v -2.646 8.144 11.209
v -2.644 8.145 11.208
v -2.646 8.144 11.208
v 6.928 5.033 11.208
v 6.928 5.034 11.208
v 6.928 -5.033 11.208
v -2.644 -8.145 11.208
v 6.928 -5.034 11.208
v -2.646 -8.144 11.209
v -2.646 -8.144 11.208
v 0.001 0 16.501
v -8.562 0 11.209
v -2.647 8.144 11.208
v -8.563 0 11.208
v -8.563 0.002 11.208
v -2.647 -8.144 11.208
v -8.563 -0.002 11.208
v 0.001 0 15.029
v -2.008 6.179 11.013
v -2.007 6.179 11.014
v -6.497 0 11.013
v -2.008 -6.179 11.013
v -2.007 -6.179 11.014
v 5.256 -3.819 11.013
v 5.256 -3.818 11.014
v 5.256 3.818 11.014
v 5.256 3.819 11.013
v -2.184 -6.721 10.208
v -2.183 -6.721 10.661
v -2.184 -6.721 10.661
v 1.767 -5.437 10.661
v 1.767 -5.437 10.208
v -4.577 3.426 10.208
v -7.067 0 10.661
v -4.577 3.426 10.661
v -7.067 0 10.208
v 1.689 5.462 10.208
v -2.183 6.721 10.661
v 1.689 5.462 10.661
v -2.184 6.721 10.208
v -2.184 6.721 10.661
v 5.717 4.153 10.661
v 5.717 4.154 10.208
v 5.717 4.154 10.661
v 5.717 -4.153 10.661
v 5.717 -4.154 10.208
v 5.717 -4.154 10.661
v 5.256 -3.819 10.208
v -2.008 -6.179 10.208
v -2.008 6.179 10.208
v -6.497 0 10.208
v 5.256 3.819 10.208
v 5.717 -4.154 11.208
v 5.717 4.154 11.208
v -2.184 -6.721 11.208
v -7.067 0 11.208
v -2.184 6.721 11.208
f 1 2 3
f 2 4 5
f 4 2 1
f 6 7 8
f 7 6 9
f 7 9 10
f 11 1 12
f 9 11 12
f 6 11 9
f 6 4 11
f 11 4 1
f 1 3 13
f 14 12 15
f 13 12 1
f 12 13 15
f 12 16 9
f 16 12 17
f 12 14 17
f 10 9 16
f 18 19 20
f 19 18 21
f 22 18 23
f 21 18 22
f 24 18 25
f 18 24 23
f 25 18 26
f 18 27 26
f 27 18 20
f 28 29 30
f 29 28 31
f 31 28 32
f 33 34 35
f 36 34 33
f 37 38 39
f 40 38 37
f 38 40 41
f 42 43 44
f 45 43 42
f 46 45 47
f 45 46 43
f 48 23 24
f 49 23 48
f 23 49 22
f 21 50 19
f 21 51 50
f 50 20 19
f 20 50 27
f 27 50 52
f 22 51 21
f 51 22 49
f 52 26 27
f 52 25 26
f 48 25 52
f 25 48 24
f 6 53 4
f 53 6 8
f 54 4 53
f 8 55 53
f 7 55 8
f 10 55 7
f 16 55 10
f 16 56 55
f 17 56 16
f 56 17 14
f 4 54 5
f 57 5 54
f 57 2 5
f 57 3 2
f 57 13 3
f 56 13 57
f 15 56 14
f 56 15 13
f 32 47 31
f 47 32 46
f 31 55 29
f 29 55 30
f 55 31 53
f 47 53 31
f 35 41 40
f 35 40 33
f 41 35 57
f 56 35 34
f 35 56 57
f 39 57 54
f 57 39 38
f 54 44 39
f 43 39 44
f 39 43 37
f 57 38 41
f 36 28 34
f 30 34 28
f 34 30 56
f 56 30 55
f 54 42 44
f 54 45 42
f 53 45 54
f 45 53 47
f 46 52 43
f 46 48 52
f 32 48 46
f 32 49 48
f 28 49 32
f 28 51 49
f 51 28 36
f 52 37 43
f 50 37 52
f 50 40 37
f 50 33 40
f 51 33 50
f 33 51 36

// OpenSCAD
//arete = 21.409;
diameter = 33;
creux = 1; // creux ou plein || 1 ou 0
paroi = 1;
bouchon = 1; // 1 ou 0
corps = 0; // 1 ou 0
rotate_body = 0;
bottom_hole = 1; // 1 ou 0
bottom_hole_diameter = 1.5;
bouchonOffset = 0.4;
r = 0.19; // résolution d'impression sur l'axe Z

// Controle rotation viewport quand animation en route
//$vpr = [70, 0, $t * 180];

/* Forme
Choix parmi:
- 0 => Etoilé
- 1 => Christique
- 2 => Christique_inversé
- 3 => Pentakis // (all points on sphere)
- 4 => Animate // voir plus bas pour plus d'infos
*/
forme_ID = 1;

/////////

function dodeca_ext_radius(a) =
    a/2*(sqrt(2));

function dodeca_inradius(a) =
    a*sqrt(5/8+11/(8*sqrt(5)));

function dodeca_arete_from_inradius(radius) =
    radius/sqrt(5/8+11/(8*sqrt(5)));

function christic_arete_from_external_diameter(diam) =
    diam/(sqrt((5/2)+(11/10)*sqrt(5))+2*sqrt((5-sqrt(5))/10));

// rayon cercle inscrit
function polygon_apothem(arete, sides) =
  arete/(2*tan(180/sides));

function polygon_apothem_from_circumradius(circumradius, sides) =
  circumradius*cos(180/sides);

function polygon_circumradius_from_apothem(apothem, sides) =
  apothem/cos(180/sides);

arete = christic_arete_from_external_diameter(diameter);
areteInt = dodeca_arete_from_inradius(
            dodeca_inradius(arete)-paroi);
dodeca_inradius = dodeca_inradius(arete);

decoupe_bouchon_radius = polygon_circumradius_from_apothem(
                          polygon_apothem(arete, 5) - paroi+1*r,
                          5);
bouchon_radius = polygon_circumradius_from_apothem(
                          polygon_apothem(arete, 5) - paroi+1*r - bouchonOffset,
                          5);

echo("arete: ", arete);
echo("arete int: ", areteInt);
echo(str("dodeca_inradius : ", dodeca_inradius));
echo(str("decoupe_bouchon_radius : ", decoupe_bouchon_radius));
echo(str("bouchon_radius : ", bouchon_radius));

spike = [
    2.3417, // Etoilé, scale 1 is arete = 1.236 mm, diametre = 6.24 mm, arete pyramide = 2 mm
    0.8944, // Christique, scale 1 is arete = 1.236 mm, diametre = 4.05 mm
    -0.8944, // Christique inversé
    0.4279 // Pentakis
];

if (forme_ID == 4) {
    Animate();
} else {
    if (creux == 0) {
        small_stellated_dodecahedron(spike[forme_ID], small_stellated_dodecahedron);
    } else {
        if (corps == 1) {
          if (rotate_body == 1) {
            rotate([180, 0, 0]) corps_ouvert();
          } else {
            corps_ouvert();
          }
        }
        if (bouchon == 1) {
            bouchon();
        }
    }
}


module corps_ouvert() {

    difference() {
        poly_creux();
        decoupe_bouchon(decoupe_bouchon_radius);
    if (bottom_hole == 1) {
        bottom_hole();
    }
    }
}

module poly_creux() {
    difference() {
        small_stellated_dodecahedron(spike[forme_ID], arete);
        small_stellated_dodecahedron(spike[forme_ID], areteInt);
    }
}

module decoupe_bouchon(radius) {
    rotate([0,0,36]) translate([0,0, dodeca_inradius])
        cylinder(99, r=arete*0.853, $fn=5, center=false);
    rotate([0,0,36]) translate([0,0, dodeca_inradius-paroi])
        #cylinder(paroi, r=radius, $fn=5, center=false);
}

module supplement_feuillure_bouchon() {
    rotate([0,0,36]) translate([0,0, dodeca_inradius-paroi-1])
    difference() {
        cylinder(paroi+1, r=bouchon_radius, $fn=5, center=false);
        cylinder(paroi+1, r=bouchon_radius-3*r, $fn=5, center=false);
    }
}

module bouchon() {
    difference () {
        intersection() {
            union() {
                poly_creux();
                supplement_feuillure_bouchon();
            }
            decoupe_bouchon(bouchon_radius);
        }
    }
}

module bottom_hole() {
    rotate([0,0,0]) translate([0,0, -dodeca_inradius])
        #cylinder(dodeca_inradius, d=bottom_hole_diameter, $fn=20, center=true);
}

// }}

/*
animates the single parameter of the
module small_stellated_dodecahedron

1/ choose animate in the view menu
2/ sets fps to an appropiate number for
your machine - 20 is good
3/ set steps to a number that keeps the
change from happening too slowly or
too fast - 200 is good
*/
module Animate() {
    small_stellated_dodecahedron(-3.4317*abs(2*$t-1)+2.4317);
}

// Étoilé
// scale 1 is arete = 1.236 mm, diametre = 6.24 mm, arete pyramide = 2 mm
module Etoile(a) {
    small_stellated_dodecahedron(2.3417, a);
}

// Christique
// scale 1 is arete = 1.236 mm, diametre = 4.05 mm
module Christique(a) {
    small_stellated_dodecahedron(0.8944, a);
}

// Christique inversé
module Christique_inv(a) {
    small_stellated_dodecahedron(-0.8944, a);
}

// Pentakis (all points on sphere)
module Pentakis(a) {
    small_stellated_dodecahedron(0.4279, a);
}

module small_stellated_dodecahedron(scale, ar)
{
a=scale*0.61803;
b=scale*0.38197;

length = ar ? ar : arete;
echo("length:", length);
// scale(1) => arete 1.236 mm
scale(length/1.236)

// Posé sur 3 pointes
//rotate([20.91, 0, 0])

// Posé sur 1 pointe
rotate([0, 31.72, 0])

/*
constructed from 12 pentagonal pyramids placed
on the faces of a dodecahedron.
first 20 points are the vertices of a dodecahedron
next 12 points are the vertices of the centers
of the faces of the dodecahedron

if scale = 0 a dodecahedron is created

if scale is positive the centers of the
faces are moved out fron the center of the
dodecahedron

if scale is negative the centers of the
faces are moved in towards the center of the
dodecahedron

the apex angles of the triangles that make up
the faces of the stellated dodecahedron
are 36 degrees - the scale factor that
makes a small stellated dodecahedron
is approximately 2.3417
length of side of pentagonal pyramid for
small stellated dodecahedron = 2

the apex angles of the triangles that make up
the faces of a pentakis dodecahedron ( one of
the Catalan solids) are about 68.619 degrees
the scale factor to make one is ca 0.4279

if len = length of the sides of the
pentagonal pyramid then approximately

scale = + or - sqrt((len*len/0.52786) - 2.09443)

lengths of the sides of the base are sqrt(5)-1
or 1.23607 to make equilateral triangles scale
factor is 0.8944

distance from centers of faces to origin ca 1.37638
distance from dodecahedral points to origin sqrt(3)




pcm

*/

polyhedron
       (points = [
                 [   1.00000,   1.00000,   1.00000],
                 [   1.00000,   1.00000,  -1.00000],
                 [   1.00000,  -1.00000,   1.00000],
                 [   1.00000,  -1.00000,  -1.00000],
                 [  -1.00000,   1.00000,   1.00000],
                 [  -1.00000,   1.00000,  -1.00000],
                 [  -1.00000,  -1.00000,   1.00000],
                 [  -1.00000,  -1.00000,  -1.00000],
                 [   0.00000,   0.61803,   1.61803],
                 [   0.00000,   0.61803,  -1.61803],
                 [   0.00000,  -0.61803,   1.61803],
                 [   0.00000,  -0.61803,  -1.61803],
                 [   0.61803,   1.61803,   0.00000],
                 [   0.61803,  -1.61803,   0.00000],
                 [  -0.61803,   1.61803,   0.00000],
                 [  -0.61803,  -1.61803,   0.00000],
                 [   1.61803,   0.00000,   0.61803],
                 [   1.61803,   0.00000,  -0.61803],
                 [  -1.61803,   0.00000,   0.61803],
                 [  -1.61803,   0.00000,  -0.61803],
                 [   1.17082+a,   0.72361+b,   0.00000],
                 [   0.72361+b,   0.00000,   1.17082+a],
                 [   0.00000,   1.17082+a,   0.72361+b],
                 [   0.00000,   1.17082+a,  -0.72361-b],
                 [   0.72361+b,   0.00000,  -1.17082-a],
                 [   1.17082+a,  -0.72361-b,   0.00000],
                 [   0.00000,  -1.17082-a,   0.72361+b],
                 [   0.00000,  -1.17082-a,  -0.72361-b],
                 [  -0.72361-b,   0.00000,   1.17082+a],
                 [  -1.17082-a,   0.72361+b,   0.00000],
                 [  -0.72361-b,   0.00000,  -1.17082-a],
                 [  -1.17082-a,  -0.72361-b,   0.00000],
                   ],

           faces = [

                [0,20,16],[16,20,17],[17,20,1],
                [1,20,12],[12,20,0],
                [0,21,8],[8,21,10],[10,21,2],
                [2,21,16],[16,21,0],
                 [0,22,12],[12,22,14],[14,22,4],
                [4,22,8],[8,22,0],
                [1,23,9],[9,23,5],[5,23,14],
                [14,23,12],[12,23,1],
                [1,24,17],[17,24,3],[3,24,11],
                [11,24,9],[9,24,1],
                [16,25,2],[17,25,16],[3,25,17],
                 [13,25,3],[2,25,13],
                 [2,26,10],[10,26,6],[6,26,15],
                 [15,26,13],[13,26,2],
                 [3,27,13],[13,27,15],[15,27,7],
                 [7,27,11],[11,27,3],
                [4,28,18],[18,28,6],[6,28,10],
                 [10,28,8],[8,28,4],
                 [4,29,14],[14,29,5],[5,29,19],
                 [19,29,18],[18,29,4],
                  [5,30,9],[9,30,11],[11,30,7],
                 [7,30,19],[19,30,5],
                 [6,31,18],[18,31,19],[19,31,7],
                 [7,31,15],[15,31,6],

                 ]
      );
}
